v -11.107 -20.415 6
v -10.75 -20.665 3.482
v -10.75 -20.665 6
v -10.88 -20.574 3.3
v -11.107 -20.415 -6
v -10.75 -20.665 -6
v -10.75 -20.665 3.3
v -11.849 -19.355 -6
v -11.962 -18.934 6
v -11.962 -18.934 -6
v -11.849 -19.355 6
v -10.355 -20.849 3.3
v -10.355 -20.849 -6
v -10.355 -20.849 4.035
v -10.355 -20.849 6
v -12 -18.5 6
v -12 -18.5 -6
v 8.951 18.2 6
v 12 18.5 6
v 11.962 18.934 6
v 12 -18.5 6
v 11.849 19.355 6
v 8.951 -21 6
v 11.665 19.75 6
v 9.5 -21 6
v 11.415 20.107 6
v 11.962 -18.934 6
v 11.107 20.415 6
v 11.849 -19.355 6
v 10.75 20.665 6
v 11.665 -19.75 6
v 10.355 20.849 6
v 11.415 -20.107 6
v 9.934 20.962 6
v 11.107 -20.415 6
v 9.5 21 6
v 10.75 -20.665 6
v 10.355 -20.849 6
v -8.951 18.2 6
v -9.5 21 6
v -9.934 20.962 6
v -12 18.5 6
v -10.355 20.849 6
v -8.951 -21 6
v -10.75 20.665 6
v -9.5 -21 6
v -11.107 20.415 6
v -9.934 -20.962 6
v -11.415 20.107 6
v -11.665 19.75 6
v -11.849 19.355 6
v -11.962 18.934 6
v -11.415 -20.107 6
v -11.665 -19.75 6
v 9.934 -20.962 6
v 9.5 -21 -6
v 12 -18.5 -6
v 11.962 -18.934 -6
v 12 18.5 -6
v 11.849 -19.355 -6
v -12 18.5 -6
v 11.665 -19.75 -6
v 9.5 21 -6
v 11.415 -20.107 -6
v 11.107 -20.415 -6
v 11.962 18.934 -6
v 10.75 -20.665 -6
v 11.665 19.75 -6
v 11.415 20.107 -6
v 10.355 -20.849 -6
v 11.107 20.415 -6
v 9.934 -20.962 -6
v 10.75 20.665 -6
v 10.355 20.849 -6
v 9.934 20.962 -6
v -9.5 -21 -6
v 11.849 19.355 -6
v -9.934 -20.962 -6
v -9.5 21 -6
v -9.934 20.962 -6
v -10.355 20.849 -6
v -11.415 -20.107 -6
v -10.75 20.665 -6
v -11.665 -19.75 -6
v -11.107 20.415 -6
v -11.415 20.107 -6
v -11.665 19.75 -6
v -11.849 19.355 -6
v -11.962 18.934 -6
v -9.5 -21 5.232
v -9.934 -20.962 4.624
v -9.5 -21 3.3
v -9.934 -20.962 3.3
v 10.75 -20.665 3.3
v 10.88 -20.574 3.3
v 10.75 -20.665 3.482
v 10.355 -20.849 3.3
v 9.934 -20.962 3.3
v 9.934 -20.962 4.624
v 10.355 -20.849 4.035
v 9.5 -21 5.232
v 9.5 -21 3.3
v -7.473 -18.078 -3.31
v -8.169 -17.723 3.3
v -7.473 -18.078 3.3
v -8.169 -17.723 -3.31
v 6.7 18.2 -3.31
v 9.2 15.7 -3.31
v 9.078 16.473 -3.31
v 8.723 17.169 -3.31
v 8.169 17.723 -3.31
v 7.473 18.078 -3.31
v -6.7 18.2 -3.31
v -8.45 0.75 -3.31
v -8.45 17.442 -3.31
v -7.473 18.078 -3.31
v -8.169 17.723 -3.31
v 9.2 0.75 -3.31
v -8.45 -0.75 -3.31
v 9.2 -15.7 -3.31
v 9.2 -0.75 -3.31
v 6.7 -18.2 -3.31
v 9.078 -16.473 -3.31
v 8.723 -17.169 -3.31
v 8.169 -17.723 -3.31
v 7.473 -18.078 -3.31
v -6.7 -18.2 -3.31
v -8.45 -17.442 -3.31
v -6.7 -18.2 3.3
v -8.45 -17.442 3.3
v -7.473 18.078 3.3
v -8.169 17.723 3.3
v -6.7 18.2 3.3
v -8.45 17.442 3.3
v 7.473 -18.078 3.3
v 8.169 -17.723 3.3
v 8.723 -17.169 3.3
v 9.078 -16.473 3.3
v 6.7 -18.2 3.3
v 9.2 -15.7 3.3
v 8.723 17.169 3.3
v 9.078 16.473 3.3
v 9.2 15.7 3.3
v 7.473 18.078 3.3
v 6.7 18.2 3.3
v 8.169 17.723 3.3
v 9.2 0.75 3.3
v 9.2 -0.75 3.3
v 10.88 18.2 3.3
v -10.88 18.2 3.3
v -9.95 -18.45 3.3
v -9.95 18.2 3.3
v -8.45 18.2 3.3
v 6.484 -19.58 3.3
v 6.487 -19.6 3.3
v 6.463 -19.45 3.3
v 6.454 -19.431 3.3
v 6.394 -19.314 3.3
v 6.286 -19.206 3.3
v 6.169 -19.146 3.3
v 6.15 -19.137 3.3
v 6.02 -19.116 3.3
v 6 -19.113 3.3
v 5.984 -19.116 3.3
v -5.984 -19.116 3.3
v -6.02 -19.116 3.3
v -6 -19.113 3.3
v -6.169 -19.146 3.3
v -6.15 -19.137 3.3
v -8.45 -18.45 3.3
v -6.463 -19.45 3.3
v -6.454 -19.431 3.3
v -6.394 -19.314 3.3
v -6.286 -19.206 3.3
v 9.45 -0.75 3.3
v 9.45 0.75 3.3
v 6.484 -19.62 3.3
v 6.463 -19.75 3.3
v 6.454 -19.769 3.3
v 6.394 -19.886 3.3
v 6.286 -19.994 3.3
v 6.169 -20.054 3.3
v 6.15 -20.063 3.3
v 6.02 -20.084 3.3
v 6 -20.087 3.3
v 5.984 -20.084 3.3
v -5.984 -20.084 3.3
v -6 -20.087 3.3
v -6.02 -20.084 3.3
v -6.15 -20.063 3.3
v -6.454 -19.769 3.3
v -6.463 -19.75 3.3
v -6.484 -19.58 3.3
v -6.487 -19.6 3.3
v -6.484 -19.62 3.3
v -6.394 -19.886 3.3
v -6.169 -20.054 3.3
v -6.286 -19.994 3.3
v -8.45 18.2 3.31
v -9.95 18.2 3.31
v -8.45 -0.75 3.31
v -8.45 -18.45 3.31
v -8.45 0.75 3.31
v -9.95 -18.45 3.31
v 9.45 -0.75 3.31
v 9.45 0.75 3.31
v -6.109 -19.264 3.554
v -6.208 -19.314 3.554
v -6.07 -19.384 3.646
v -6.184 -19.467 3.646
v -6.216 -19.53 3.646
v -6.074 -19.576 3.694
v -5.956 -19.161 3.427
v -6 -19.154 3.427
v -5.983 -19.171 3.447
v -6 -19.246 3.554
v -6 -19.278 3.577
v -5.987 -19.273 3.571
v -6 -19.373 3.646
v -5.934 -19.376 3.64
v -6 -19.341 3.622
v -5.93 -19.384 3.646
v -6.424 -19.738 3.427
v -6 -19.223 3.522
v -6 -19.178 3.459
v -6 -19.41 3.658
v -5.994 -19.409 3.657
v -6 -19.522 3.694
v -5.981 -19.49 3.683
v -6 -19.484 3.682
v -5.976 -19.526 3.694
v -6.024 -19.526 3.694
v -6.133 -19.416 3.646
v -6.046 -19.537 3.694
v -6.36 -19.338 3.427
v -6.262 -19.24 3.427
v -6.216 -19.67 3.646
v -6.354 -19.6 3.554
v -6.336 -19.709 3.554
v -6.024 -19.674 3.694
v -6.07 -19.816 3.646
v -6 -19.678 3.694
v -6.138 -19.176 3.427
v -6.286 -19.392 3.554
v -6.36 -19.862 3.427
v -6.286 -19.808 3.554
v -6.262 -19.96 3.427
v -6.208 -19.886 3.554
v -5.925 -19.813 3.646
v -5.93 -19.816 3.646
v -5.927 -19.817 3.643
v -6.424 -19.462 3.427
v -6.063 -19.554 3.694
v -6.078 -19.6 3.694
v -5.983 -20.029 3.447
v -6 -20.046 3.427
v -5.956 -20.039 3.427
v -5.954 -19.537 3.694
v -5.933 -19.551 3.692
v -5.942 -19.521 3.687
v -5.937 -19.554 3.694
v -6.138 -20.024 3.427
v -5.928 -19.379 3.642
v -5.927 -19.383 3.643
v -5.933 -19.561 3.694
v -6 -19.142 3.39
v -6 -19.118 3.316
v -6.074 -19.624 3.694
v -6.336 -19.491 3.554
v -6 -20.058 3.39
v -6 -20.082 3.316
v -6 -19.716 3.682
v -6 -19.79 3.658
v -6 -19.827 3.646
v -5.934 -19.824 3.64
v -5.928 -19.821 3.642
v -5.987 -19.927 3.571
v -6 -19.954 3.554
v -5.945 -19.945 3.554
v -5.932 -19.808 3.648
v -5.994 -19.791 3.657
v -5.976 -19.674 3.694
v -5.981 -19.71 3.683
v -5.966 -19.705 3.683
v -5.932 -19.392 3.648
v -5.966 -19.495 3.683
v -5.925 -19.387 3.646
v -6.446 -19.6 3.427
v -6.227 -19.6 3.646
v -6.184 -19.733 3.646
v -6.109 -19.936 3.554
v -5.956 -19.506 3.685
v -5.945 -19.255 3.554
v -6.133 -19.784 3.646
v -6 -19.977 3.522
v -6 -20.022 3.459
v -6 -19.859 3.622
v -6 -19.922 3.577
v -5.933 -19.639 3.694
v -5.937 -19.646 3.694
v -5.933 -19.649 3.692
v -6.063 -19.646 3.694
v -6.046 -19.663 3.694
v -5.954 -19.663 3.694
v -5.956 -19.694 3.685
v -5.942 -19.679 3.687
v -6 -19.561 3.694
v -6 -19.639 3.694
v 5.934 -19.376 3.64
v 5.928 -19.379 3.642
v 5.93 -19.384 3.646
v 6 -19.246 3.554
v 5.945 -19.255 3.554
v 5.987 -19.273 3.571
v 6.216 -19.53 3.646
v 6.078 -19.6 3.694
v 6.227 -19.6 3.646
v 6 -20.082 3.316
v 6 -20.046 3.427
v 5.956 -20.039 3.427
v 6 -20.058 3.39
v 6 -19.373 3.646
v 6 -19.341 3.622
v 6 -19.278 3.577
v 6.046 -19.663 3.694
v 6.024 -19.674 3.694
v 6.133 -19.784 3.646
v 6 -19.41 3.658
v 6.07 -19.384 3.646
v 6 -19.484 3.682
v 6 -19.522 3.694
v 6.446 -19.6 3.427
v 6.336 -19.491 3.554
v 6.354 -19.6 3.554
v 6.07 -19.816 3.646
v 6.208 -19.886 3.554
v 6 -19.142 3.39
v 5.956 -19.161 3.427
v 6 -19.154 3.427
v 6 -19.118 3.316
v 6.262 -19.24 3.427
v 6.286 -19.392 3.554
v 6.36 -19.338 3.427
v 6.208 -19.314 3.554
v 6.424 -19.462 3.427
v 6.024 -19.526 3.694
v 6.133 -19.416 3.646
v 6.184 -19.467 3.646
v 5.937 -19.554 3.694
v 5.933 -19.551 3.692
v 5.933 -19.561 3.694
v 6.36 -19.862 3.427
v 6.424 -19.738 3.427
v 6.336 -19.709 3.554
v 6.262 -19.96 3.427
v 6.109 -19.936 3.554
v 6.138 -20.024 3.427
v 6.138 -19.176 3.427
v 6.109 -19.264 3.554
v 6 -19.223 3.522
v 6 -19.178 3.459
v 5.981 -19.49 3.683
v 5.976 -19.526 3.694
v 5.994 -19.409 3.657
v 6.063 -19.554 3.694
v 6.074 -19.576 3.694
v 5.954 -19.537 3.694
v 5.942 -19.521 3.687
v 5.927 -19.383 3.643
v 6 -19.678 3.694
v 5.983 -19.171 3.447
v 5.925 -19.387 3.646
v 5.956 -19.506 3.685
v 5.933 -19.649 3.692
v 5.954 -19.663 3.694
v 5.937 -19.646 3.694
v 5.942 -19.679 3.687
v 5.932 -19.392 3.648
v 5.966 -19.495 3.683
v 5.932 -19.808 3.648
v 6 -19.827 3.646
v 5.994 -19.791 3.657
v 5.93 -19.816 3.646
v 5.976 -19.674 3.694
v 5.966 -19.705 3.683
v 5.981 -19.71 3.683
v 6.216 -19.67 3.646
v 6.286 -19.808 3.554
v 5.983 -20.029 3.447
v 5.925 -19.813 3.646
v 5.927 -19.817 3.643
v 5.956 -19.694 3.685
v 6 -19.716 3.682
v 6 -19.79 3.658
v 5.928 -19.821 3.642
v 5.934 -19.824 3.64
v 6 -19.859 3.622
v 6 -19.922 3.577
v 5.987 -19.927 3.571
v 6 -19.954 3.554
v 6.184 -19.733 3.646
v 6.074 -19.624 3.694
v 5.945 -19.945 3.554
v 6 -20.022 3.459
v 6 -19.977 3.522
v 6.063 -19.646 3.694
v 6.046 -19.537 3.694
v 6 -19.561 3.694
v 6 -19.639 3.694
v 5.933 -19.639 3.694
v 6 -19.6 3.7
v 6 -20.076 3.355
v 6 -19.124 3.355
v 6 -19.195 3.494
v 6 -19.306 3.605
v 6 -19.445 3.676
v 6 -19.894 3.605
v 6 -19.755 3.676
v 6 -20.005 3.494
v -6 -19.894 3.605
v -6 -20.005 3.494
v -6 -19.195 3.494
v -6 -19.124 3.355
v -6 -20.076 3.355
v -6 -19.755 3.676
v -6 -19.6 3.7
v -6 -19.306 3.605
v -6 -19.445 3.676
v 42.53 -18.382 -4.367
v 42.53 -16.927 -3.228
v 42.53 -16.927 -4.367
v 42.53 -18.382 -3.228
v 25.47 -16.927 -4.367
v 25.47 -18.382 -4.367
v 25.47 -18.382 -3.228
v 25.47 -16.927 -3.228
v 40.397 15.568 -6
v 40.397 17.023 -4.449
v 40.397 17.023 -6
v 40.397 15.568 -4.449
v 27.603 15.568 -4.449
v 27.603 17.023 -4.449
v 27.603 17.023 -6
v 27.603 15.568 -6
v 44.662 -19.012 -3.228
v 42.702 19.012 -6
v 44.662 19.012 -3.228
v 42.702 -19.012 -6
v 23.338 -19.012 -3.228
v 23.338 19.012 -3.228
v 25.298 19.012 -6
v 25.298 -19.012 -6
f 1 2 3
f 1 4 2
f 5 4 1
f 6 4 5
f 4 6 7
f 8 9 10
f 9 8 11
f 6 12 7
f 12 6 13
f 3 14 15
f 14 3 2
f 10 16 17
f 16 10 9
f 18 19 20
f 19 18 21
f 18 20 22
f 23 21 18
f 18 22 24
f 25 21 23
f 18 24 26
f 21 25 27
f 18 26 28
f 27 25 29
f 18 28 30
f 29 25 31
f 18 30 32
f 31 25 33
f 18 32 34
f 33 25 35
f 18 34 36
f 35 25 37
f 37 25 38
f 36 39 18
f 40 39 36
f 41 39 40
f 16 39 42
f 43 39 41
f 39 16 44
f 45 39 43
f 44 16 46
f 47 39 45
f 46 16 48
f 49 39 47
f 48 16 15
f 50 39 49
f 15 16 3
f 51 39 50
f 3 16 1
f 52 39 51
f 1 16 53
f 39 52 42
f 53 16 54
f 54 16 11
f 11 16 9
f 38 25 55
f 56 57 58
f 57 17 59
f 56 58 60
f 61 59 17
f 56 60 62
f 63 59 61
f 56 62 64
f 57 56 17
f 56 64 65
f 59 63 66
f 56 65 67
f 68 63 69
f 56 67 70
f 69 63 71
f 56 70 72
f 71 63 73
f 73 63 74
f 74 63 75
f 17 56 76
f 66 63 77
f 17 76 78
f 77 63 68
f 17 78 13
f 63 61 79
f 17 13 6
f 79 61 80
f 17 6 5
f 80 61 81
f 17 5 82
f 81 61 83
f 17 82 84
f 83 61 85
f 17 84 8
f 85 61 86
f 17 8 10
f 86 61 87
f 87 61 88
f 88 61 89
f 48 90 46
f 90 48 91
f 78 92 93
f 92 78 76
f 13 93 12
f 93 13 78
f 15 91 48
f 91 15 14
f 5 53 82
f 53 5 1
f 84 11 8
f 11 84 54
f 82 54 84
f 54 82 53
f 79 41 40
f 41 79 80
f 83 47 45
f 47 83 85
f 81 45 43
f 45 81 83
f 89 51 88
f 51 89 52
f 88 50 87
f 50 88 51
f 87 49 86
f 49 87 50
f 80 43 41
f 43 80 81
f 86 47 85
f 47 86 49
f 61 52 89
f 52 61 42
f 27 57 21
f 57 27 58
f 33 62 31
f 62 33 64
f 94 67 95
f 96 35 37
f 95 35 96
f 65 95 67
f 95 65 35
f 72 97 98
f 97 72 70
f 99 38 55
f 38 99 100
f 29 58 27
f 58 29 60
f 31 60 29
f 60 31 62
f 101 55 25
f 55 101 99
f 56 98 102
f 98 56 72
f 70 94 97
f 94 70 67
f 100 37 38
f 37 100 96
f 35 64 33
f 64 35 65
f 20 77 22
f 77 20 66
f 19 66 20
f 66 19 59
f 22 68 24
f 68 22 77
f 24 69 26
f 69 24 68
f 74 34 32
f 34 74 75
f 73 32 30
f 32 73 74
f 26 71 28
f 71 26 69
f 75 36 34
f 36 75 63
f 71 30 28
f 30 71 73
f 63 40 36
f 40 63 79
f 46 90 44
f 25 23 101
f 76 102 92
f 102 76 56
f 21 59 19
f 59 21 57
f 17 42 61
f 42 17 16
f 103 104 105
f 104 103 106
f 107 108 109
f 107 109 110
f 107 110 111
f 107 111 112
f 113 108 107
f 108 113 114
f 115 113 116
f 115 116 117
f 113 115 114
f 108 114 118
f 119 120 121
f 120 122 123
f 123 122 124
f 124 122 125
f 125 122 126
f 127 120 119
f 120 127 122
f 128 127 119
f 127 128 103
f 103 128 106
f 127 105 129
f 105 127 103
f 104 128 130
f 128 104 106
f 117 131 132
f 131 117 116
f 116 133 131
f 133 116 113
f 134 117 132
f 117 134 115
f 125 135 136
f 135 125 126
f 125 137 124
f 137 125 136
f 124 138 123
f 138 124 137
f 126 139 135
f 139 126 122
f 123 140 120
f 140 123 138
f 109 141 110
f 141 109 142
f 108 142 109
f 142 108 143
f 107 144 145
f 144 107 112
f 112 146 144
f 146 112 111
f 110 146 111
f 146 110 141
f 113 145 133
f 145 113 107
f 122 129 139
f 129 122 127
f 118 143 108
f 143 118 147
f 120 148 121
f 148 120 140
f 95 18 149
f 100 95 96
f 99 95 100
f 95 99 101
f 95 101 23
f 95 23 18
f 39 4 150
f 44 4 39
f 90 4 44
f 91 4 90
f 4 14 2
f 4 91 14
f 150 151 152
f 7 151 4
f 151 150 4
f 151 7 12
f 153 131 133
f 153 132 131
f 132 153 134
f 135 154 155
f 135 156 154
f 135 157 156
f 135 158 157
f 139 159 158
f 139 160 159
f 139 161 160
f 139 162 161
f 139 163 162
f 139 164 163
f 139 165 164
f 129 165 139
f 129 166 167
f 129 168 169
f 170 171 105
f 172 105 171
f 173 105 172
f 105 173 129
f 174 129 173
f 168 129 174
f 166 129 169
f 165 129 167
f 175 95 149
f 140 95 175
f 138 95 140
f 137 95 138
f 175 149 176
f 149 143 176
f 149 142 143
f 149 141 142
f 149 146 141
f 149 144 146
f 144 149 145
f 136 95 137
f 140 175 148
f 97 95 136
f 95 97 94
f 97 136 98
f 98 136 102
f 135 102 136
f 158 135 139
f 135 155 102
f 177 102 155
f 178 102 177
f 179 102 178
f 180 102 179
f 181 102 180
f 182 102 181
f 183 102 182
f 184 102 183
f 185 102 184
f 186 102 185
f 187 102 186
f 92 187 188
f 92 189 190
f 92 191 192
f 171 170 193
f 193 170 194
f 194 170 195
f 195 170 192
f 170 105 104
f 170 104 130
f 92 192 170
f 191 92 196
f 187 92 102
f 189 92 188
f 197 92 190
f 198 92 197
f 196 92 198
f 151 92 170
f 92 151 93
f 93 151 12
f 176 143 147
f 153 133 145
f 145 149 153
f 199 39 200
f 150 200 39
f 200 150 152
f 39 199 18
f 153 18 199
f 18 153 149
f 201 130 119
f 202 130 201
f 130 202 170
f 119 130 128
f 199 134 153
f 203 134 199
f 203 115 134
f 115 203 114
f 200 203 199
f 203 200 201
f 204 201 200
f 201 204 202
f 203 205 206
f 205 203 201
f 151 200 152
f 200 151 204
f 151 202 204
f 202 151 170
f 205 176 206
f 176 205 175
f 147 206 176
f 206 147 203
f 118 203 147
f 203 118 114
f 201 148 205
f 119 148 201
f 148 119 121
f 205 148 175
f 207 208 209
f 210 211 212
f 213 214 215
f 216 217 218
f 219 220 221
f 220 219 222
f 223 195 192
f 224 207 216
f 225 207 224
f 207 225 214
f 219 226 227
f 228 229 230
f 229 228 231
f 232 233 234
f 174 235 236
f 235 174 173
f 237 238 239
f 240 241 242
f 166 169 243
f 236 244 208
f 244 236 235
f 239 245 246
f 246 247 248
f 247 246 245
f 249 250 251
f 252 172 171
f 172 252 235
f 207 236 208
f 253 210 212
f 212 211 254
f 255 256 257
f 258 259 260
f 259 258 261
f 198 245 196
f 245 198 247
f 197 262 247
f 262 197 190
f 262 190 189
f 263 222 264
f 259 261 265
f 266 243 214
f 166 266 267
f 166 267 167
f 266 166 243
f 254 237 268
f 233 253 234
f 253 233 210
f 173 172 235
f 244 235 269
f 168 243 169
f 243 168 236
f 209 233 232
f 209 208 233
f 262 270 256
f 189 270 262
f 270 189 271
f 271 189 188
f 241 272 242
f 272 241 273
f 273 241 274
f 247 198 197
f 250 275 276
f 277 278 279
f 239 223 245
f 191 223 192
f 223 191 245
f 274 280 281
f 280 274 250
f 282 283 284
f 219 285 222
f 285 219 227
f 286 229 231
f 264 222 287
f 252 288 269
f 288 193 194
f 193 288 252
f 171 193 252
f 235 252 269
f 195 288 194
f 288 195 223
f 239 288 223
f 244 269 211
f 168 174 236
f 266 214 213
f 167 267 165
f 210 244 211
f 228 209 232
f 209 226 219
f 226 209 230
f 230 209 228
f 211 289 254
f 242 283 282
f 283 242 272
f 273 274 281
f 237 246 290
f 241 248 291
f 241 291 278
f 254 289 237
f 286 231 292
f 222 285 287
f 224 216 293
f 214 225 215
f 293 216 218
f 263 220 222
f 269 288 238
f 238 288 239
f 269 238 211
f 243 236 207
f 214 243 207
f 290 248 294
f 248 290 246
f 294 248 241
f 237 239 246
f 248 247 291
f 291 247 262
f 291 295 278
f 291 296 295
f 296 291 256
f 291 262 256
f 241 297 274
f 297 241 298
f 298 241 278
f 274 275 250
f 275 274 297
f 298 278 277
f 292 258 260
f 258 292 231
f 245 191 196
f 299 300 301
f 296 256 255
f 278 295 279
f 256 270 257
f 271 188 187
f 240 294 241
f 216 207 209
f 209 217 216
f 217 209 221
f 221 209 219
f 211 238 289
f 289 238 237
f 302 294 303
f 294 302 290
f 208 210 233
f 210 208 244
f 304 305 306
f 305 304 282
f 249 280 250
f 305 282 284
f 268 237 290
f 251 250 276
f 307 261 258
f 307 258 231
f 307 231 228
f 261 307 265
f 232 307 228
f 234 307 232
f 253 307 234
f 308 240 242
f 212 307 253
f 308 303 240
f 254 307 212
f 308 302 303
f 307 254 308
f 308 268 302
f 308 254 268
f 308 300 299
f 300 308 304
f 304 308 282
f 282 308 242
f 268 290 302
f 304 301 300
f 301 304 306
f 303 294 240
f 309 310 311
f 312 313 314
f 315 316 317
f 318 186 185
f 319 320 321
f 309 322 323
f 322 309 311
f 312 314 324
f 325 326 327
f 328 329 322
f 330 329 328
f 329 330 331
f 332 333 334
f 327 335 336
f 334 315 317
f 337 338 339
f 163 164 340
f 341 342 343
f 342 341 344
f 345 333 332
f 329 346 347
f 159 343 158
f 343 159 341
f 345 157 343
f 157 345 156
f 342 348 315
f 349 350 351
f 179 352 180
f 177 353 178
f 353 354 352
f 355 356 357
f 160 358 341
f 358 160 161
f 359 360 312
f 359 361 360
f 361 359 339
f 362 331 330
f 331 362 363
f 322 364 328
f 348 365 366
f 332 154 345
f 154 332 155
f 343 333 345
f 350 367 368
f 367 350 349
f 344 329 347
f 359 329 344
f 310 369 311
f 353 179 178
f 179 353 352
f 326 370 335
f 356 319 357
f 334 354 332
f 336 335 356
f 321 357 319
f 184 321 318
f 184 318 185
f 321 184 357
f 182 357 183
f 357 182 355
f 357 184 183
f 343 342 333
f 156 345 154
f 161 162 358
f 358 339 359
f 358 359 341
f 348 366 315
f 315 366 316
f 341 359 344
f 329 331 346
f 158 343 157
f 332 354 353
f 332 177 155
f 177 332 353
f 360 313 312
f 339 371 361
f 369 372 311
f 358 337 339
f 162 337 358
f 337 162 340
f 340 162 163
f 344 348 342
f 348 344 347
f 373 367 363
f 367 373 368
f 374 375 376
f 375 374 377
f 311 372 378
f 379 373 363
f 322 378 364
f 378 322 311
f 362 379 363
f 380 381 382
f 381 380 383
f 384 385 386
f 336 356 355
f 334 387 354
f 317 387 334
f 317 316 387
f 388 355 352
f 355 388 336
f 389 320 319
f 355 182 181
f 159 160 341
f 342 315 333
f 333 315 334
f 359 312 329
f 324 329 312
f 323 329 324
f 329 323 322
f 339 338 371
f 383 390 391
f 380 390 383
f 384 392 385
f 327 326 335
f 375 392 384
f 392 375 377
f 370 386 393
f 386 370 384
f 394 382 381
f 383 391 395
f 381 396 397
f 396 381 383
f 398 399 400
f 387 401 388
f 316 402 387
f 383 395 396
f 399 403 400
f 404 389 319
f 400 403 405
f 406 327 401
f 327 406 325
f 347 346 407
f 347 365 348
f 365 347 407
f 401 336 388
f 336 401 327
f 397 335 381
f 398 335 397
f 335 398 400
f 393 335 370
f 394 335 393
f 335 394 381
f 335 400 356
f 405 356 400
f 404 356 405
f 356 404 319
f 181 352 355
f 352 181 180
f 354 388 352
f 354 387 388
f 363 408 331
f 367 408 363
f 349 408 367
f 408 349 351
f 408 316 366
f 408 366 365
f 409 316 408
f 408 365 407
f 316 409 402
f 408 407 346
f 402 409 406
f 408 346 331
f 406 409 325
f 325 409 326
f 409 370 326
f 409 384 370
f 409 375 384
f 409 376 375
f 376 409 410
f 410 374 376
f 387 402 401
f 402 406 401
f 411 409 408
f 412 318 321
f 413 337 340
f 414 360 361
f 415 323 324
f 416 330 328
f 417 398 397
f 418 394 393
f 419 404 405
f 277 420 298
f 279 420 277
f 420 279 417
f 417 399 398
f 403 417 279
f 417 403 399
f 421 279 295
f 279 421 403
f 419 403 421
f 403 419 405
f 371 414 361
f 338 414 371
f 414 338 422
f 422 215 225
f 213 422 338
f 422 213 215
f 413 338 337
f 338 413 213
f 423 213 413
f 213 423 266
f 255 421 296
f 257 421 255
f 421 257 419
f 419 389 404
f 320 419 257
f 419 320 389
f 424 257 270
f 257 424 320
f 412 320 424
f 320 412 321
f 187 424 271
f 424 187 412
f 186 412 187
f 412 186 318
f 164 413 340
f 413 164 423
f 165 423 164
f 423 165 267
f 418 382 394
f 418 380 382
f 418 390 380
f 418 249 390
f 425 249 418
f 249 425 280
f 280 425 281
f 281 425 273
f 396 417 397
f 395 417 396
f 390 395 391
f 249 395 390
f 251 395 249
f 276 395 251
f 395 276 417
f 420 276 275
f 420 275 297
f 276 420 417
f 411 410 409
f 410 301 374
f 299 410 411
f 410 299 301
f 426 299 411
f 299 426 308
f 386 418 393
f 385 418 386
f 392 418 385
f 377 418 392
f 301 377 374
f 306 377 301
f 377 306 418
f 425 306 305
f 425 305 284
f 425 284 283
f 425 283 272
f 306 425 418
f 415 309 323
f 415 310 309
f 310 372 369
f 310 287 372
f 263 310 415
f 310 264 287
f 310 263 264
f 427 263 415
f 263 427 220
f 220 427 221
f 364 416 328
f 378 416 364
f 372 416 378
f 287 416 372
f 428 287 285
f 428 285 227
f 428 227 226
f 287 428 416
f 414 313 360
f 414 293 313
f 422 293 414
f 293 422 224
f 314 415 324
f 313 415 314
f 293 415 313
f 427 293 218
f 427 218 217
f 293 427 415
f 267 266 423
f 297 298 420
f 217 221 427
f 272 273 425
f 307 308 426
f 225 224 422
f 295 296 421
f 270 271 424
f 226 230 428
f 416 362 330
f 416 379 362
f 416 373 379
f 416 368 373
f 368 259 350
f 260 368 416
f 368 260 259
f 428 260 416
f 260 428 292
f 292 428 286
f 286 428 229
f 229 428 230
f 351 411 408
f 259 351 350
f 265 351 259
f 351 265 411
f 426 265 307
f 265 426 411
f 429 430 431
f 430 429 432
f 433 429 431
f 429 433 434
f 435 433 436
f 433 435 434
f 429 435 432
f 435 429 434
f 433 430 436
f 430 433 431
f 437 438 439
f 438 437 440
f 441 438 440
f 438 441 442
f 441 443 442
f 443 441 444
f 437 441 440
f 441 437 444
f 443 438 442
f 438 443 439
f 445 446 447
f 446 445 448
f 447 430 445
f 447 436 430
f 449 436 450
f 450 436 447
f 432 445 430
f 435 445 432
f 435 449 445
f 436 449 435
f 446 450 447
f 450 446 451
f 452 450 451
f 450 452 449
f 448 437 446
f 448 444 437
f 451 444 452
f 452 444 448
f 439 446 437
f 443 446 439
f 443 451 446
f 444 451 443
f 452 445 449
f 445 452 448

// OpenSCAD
include <MCAD/boxes.scad>

//Pill box with sliding lid

/* [Outside Box Dimensions] */
//Box Width (min: 5 x Wall Thickness)
bX=24; 
//Box Depth (min: 5 x Wall Thickness)
bY=42; 
//Box Height (min: 5 x Wall Thickness)
bZ=12;
//Corner Radius (radius of the corner fillet inside and outside)
corner=2.5; 
//X Dividers (0 for no dividers)
col=0; 
//Y Dividers (0 for no dividers)
row=2; 
//Divider Wall Thickness
divWall=1.5;

/* [Wall Thickness] */
//Wall Thickness (min: 2mm)
wall=2.8;

/* [Lid] */
//Lid Lip Width (min: 1mm)
lip=2;
//Snugness of Lid (values approaching 1.0 result in a snugger fit)
snug=.99; 

/* [Catch] */
//Catch Height (height over the lip for the catch)
catch=1;

/* [Hidden] */
boxDim=[bX, bY, bZ]; 
over=.5; //amount to extend parts that need to have interference (such as dividers)
module xDiv(inSide){
  xInc=inSide[0]/col;
  for ( i = [1 : col-1] ) {
    translate([i*xInc, 0, 0])cube([divWall, inSide[1]+over, inSide[2]+over], center=true);
  }
}


module yDiv(inSide){
  yInc=inSide[1]/row;
  for (i = [1 : row-1] ) {
    translate([0, i*yInc, 0])cube([inSide[0]+over, divWall, inSide[2]+over], center=true);
  }
}

module drawBox () {
  innerBox=[bX-(2*wall), bY-(2*wall), bZ-(2*wall)+.22];
  echo("innerBox=", innerBox);
  union() {
    difference() {
      roundedBox(boxDim, corner, sidesonly=1, $fn=36);
      roundedBox(innerBox, corner, sidesonly=1, $fn=20);
      translate([0, -wall, bZ/2+.1]) cutLid(0);
    }
    translate([-innerBox[0]/2, 0, -over/2]) xDiv(innerBox);
    translate([0, -innerBox[1]/2, -over/2]) yDiv(innerBox);
  }
}

module cutLid(shorten, catch) {
  //Create a trapezoid lid 

  insideLip=wall*1.2; //lip inside the box for the lid to rest upon
  lX=bX-(2*wall)+insideLip;
  lY=bY-shorten;

  echo("inside lip=", insideLip/2);

  //polygon points
  p0=[0, 0];
  p1=[lX, 0];
  p2=[lX-lip, wall];
  p3=[lip, wall];

  // this needs to be less than 45 deg to be usable
  echo("Lip Overhang (degrees)=", atan(lip/wall));
  
  difference() {
    rotate([90,0,0])
      translate([-lX/2, -wall, 0]) 
      linear_extrude(height=lY, center=true) polygon([p0, p1, p2, p3], paths=[[0,1,2,3]]);
    if (catch==1) {
      translate([0, lY/2-wall/2, -wall+catch/2]) cube([lX*.8, catch*1.5, catch*1.3], center=true);
      //Add an additional slot to make it easier to slide open the lid
      translate([0, -lY/2+wall, wall/3]) cube([lX*.6, catch*1.5, catch*5], center=true);
    } else {
      echo("catch=false");
    }

  }
}

module drawCatch() {
  rad=catch/2;
  lX=bX-2*(wall+.2);

  union() {
    translate([-lX/3, 0, 0]) sphere(r=rad, $fn=20);
    translate([ lX/3, 0, 0]) sphere(r=rad, $fn=20);
    rotate([0,90,0])cylinder(h=lX/1.5, r=rad, center=true, $fn=20);
  }
}

module assemble() {
    union() {
      drawBox();
      //move the catch to the front of the box
      translate([0, -(bY/2)+wall/2, bZ/2-wall]) drawCatch();
    }
  //draw the lid (wall, 1) - second paramater specifies to add a hole for a catch
  translate([bX+10, 0, (-bZ/2)]) rotate([180, 0, 0]) scale([snug-.01, snug-.02, snug]) cutLid(wall, 1);
}

assemble();
